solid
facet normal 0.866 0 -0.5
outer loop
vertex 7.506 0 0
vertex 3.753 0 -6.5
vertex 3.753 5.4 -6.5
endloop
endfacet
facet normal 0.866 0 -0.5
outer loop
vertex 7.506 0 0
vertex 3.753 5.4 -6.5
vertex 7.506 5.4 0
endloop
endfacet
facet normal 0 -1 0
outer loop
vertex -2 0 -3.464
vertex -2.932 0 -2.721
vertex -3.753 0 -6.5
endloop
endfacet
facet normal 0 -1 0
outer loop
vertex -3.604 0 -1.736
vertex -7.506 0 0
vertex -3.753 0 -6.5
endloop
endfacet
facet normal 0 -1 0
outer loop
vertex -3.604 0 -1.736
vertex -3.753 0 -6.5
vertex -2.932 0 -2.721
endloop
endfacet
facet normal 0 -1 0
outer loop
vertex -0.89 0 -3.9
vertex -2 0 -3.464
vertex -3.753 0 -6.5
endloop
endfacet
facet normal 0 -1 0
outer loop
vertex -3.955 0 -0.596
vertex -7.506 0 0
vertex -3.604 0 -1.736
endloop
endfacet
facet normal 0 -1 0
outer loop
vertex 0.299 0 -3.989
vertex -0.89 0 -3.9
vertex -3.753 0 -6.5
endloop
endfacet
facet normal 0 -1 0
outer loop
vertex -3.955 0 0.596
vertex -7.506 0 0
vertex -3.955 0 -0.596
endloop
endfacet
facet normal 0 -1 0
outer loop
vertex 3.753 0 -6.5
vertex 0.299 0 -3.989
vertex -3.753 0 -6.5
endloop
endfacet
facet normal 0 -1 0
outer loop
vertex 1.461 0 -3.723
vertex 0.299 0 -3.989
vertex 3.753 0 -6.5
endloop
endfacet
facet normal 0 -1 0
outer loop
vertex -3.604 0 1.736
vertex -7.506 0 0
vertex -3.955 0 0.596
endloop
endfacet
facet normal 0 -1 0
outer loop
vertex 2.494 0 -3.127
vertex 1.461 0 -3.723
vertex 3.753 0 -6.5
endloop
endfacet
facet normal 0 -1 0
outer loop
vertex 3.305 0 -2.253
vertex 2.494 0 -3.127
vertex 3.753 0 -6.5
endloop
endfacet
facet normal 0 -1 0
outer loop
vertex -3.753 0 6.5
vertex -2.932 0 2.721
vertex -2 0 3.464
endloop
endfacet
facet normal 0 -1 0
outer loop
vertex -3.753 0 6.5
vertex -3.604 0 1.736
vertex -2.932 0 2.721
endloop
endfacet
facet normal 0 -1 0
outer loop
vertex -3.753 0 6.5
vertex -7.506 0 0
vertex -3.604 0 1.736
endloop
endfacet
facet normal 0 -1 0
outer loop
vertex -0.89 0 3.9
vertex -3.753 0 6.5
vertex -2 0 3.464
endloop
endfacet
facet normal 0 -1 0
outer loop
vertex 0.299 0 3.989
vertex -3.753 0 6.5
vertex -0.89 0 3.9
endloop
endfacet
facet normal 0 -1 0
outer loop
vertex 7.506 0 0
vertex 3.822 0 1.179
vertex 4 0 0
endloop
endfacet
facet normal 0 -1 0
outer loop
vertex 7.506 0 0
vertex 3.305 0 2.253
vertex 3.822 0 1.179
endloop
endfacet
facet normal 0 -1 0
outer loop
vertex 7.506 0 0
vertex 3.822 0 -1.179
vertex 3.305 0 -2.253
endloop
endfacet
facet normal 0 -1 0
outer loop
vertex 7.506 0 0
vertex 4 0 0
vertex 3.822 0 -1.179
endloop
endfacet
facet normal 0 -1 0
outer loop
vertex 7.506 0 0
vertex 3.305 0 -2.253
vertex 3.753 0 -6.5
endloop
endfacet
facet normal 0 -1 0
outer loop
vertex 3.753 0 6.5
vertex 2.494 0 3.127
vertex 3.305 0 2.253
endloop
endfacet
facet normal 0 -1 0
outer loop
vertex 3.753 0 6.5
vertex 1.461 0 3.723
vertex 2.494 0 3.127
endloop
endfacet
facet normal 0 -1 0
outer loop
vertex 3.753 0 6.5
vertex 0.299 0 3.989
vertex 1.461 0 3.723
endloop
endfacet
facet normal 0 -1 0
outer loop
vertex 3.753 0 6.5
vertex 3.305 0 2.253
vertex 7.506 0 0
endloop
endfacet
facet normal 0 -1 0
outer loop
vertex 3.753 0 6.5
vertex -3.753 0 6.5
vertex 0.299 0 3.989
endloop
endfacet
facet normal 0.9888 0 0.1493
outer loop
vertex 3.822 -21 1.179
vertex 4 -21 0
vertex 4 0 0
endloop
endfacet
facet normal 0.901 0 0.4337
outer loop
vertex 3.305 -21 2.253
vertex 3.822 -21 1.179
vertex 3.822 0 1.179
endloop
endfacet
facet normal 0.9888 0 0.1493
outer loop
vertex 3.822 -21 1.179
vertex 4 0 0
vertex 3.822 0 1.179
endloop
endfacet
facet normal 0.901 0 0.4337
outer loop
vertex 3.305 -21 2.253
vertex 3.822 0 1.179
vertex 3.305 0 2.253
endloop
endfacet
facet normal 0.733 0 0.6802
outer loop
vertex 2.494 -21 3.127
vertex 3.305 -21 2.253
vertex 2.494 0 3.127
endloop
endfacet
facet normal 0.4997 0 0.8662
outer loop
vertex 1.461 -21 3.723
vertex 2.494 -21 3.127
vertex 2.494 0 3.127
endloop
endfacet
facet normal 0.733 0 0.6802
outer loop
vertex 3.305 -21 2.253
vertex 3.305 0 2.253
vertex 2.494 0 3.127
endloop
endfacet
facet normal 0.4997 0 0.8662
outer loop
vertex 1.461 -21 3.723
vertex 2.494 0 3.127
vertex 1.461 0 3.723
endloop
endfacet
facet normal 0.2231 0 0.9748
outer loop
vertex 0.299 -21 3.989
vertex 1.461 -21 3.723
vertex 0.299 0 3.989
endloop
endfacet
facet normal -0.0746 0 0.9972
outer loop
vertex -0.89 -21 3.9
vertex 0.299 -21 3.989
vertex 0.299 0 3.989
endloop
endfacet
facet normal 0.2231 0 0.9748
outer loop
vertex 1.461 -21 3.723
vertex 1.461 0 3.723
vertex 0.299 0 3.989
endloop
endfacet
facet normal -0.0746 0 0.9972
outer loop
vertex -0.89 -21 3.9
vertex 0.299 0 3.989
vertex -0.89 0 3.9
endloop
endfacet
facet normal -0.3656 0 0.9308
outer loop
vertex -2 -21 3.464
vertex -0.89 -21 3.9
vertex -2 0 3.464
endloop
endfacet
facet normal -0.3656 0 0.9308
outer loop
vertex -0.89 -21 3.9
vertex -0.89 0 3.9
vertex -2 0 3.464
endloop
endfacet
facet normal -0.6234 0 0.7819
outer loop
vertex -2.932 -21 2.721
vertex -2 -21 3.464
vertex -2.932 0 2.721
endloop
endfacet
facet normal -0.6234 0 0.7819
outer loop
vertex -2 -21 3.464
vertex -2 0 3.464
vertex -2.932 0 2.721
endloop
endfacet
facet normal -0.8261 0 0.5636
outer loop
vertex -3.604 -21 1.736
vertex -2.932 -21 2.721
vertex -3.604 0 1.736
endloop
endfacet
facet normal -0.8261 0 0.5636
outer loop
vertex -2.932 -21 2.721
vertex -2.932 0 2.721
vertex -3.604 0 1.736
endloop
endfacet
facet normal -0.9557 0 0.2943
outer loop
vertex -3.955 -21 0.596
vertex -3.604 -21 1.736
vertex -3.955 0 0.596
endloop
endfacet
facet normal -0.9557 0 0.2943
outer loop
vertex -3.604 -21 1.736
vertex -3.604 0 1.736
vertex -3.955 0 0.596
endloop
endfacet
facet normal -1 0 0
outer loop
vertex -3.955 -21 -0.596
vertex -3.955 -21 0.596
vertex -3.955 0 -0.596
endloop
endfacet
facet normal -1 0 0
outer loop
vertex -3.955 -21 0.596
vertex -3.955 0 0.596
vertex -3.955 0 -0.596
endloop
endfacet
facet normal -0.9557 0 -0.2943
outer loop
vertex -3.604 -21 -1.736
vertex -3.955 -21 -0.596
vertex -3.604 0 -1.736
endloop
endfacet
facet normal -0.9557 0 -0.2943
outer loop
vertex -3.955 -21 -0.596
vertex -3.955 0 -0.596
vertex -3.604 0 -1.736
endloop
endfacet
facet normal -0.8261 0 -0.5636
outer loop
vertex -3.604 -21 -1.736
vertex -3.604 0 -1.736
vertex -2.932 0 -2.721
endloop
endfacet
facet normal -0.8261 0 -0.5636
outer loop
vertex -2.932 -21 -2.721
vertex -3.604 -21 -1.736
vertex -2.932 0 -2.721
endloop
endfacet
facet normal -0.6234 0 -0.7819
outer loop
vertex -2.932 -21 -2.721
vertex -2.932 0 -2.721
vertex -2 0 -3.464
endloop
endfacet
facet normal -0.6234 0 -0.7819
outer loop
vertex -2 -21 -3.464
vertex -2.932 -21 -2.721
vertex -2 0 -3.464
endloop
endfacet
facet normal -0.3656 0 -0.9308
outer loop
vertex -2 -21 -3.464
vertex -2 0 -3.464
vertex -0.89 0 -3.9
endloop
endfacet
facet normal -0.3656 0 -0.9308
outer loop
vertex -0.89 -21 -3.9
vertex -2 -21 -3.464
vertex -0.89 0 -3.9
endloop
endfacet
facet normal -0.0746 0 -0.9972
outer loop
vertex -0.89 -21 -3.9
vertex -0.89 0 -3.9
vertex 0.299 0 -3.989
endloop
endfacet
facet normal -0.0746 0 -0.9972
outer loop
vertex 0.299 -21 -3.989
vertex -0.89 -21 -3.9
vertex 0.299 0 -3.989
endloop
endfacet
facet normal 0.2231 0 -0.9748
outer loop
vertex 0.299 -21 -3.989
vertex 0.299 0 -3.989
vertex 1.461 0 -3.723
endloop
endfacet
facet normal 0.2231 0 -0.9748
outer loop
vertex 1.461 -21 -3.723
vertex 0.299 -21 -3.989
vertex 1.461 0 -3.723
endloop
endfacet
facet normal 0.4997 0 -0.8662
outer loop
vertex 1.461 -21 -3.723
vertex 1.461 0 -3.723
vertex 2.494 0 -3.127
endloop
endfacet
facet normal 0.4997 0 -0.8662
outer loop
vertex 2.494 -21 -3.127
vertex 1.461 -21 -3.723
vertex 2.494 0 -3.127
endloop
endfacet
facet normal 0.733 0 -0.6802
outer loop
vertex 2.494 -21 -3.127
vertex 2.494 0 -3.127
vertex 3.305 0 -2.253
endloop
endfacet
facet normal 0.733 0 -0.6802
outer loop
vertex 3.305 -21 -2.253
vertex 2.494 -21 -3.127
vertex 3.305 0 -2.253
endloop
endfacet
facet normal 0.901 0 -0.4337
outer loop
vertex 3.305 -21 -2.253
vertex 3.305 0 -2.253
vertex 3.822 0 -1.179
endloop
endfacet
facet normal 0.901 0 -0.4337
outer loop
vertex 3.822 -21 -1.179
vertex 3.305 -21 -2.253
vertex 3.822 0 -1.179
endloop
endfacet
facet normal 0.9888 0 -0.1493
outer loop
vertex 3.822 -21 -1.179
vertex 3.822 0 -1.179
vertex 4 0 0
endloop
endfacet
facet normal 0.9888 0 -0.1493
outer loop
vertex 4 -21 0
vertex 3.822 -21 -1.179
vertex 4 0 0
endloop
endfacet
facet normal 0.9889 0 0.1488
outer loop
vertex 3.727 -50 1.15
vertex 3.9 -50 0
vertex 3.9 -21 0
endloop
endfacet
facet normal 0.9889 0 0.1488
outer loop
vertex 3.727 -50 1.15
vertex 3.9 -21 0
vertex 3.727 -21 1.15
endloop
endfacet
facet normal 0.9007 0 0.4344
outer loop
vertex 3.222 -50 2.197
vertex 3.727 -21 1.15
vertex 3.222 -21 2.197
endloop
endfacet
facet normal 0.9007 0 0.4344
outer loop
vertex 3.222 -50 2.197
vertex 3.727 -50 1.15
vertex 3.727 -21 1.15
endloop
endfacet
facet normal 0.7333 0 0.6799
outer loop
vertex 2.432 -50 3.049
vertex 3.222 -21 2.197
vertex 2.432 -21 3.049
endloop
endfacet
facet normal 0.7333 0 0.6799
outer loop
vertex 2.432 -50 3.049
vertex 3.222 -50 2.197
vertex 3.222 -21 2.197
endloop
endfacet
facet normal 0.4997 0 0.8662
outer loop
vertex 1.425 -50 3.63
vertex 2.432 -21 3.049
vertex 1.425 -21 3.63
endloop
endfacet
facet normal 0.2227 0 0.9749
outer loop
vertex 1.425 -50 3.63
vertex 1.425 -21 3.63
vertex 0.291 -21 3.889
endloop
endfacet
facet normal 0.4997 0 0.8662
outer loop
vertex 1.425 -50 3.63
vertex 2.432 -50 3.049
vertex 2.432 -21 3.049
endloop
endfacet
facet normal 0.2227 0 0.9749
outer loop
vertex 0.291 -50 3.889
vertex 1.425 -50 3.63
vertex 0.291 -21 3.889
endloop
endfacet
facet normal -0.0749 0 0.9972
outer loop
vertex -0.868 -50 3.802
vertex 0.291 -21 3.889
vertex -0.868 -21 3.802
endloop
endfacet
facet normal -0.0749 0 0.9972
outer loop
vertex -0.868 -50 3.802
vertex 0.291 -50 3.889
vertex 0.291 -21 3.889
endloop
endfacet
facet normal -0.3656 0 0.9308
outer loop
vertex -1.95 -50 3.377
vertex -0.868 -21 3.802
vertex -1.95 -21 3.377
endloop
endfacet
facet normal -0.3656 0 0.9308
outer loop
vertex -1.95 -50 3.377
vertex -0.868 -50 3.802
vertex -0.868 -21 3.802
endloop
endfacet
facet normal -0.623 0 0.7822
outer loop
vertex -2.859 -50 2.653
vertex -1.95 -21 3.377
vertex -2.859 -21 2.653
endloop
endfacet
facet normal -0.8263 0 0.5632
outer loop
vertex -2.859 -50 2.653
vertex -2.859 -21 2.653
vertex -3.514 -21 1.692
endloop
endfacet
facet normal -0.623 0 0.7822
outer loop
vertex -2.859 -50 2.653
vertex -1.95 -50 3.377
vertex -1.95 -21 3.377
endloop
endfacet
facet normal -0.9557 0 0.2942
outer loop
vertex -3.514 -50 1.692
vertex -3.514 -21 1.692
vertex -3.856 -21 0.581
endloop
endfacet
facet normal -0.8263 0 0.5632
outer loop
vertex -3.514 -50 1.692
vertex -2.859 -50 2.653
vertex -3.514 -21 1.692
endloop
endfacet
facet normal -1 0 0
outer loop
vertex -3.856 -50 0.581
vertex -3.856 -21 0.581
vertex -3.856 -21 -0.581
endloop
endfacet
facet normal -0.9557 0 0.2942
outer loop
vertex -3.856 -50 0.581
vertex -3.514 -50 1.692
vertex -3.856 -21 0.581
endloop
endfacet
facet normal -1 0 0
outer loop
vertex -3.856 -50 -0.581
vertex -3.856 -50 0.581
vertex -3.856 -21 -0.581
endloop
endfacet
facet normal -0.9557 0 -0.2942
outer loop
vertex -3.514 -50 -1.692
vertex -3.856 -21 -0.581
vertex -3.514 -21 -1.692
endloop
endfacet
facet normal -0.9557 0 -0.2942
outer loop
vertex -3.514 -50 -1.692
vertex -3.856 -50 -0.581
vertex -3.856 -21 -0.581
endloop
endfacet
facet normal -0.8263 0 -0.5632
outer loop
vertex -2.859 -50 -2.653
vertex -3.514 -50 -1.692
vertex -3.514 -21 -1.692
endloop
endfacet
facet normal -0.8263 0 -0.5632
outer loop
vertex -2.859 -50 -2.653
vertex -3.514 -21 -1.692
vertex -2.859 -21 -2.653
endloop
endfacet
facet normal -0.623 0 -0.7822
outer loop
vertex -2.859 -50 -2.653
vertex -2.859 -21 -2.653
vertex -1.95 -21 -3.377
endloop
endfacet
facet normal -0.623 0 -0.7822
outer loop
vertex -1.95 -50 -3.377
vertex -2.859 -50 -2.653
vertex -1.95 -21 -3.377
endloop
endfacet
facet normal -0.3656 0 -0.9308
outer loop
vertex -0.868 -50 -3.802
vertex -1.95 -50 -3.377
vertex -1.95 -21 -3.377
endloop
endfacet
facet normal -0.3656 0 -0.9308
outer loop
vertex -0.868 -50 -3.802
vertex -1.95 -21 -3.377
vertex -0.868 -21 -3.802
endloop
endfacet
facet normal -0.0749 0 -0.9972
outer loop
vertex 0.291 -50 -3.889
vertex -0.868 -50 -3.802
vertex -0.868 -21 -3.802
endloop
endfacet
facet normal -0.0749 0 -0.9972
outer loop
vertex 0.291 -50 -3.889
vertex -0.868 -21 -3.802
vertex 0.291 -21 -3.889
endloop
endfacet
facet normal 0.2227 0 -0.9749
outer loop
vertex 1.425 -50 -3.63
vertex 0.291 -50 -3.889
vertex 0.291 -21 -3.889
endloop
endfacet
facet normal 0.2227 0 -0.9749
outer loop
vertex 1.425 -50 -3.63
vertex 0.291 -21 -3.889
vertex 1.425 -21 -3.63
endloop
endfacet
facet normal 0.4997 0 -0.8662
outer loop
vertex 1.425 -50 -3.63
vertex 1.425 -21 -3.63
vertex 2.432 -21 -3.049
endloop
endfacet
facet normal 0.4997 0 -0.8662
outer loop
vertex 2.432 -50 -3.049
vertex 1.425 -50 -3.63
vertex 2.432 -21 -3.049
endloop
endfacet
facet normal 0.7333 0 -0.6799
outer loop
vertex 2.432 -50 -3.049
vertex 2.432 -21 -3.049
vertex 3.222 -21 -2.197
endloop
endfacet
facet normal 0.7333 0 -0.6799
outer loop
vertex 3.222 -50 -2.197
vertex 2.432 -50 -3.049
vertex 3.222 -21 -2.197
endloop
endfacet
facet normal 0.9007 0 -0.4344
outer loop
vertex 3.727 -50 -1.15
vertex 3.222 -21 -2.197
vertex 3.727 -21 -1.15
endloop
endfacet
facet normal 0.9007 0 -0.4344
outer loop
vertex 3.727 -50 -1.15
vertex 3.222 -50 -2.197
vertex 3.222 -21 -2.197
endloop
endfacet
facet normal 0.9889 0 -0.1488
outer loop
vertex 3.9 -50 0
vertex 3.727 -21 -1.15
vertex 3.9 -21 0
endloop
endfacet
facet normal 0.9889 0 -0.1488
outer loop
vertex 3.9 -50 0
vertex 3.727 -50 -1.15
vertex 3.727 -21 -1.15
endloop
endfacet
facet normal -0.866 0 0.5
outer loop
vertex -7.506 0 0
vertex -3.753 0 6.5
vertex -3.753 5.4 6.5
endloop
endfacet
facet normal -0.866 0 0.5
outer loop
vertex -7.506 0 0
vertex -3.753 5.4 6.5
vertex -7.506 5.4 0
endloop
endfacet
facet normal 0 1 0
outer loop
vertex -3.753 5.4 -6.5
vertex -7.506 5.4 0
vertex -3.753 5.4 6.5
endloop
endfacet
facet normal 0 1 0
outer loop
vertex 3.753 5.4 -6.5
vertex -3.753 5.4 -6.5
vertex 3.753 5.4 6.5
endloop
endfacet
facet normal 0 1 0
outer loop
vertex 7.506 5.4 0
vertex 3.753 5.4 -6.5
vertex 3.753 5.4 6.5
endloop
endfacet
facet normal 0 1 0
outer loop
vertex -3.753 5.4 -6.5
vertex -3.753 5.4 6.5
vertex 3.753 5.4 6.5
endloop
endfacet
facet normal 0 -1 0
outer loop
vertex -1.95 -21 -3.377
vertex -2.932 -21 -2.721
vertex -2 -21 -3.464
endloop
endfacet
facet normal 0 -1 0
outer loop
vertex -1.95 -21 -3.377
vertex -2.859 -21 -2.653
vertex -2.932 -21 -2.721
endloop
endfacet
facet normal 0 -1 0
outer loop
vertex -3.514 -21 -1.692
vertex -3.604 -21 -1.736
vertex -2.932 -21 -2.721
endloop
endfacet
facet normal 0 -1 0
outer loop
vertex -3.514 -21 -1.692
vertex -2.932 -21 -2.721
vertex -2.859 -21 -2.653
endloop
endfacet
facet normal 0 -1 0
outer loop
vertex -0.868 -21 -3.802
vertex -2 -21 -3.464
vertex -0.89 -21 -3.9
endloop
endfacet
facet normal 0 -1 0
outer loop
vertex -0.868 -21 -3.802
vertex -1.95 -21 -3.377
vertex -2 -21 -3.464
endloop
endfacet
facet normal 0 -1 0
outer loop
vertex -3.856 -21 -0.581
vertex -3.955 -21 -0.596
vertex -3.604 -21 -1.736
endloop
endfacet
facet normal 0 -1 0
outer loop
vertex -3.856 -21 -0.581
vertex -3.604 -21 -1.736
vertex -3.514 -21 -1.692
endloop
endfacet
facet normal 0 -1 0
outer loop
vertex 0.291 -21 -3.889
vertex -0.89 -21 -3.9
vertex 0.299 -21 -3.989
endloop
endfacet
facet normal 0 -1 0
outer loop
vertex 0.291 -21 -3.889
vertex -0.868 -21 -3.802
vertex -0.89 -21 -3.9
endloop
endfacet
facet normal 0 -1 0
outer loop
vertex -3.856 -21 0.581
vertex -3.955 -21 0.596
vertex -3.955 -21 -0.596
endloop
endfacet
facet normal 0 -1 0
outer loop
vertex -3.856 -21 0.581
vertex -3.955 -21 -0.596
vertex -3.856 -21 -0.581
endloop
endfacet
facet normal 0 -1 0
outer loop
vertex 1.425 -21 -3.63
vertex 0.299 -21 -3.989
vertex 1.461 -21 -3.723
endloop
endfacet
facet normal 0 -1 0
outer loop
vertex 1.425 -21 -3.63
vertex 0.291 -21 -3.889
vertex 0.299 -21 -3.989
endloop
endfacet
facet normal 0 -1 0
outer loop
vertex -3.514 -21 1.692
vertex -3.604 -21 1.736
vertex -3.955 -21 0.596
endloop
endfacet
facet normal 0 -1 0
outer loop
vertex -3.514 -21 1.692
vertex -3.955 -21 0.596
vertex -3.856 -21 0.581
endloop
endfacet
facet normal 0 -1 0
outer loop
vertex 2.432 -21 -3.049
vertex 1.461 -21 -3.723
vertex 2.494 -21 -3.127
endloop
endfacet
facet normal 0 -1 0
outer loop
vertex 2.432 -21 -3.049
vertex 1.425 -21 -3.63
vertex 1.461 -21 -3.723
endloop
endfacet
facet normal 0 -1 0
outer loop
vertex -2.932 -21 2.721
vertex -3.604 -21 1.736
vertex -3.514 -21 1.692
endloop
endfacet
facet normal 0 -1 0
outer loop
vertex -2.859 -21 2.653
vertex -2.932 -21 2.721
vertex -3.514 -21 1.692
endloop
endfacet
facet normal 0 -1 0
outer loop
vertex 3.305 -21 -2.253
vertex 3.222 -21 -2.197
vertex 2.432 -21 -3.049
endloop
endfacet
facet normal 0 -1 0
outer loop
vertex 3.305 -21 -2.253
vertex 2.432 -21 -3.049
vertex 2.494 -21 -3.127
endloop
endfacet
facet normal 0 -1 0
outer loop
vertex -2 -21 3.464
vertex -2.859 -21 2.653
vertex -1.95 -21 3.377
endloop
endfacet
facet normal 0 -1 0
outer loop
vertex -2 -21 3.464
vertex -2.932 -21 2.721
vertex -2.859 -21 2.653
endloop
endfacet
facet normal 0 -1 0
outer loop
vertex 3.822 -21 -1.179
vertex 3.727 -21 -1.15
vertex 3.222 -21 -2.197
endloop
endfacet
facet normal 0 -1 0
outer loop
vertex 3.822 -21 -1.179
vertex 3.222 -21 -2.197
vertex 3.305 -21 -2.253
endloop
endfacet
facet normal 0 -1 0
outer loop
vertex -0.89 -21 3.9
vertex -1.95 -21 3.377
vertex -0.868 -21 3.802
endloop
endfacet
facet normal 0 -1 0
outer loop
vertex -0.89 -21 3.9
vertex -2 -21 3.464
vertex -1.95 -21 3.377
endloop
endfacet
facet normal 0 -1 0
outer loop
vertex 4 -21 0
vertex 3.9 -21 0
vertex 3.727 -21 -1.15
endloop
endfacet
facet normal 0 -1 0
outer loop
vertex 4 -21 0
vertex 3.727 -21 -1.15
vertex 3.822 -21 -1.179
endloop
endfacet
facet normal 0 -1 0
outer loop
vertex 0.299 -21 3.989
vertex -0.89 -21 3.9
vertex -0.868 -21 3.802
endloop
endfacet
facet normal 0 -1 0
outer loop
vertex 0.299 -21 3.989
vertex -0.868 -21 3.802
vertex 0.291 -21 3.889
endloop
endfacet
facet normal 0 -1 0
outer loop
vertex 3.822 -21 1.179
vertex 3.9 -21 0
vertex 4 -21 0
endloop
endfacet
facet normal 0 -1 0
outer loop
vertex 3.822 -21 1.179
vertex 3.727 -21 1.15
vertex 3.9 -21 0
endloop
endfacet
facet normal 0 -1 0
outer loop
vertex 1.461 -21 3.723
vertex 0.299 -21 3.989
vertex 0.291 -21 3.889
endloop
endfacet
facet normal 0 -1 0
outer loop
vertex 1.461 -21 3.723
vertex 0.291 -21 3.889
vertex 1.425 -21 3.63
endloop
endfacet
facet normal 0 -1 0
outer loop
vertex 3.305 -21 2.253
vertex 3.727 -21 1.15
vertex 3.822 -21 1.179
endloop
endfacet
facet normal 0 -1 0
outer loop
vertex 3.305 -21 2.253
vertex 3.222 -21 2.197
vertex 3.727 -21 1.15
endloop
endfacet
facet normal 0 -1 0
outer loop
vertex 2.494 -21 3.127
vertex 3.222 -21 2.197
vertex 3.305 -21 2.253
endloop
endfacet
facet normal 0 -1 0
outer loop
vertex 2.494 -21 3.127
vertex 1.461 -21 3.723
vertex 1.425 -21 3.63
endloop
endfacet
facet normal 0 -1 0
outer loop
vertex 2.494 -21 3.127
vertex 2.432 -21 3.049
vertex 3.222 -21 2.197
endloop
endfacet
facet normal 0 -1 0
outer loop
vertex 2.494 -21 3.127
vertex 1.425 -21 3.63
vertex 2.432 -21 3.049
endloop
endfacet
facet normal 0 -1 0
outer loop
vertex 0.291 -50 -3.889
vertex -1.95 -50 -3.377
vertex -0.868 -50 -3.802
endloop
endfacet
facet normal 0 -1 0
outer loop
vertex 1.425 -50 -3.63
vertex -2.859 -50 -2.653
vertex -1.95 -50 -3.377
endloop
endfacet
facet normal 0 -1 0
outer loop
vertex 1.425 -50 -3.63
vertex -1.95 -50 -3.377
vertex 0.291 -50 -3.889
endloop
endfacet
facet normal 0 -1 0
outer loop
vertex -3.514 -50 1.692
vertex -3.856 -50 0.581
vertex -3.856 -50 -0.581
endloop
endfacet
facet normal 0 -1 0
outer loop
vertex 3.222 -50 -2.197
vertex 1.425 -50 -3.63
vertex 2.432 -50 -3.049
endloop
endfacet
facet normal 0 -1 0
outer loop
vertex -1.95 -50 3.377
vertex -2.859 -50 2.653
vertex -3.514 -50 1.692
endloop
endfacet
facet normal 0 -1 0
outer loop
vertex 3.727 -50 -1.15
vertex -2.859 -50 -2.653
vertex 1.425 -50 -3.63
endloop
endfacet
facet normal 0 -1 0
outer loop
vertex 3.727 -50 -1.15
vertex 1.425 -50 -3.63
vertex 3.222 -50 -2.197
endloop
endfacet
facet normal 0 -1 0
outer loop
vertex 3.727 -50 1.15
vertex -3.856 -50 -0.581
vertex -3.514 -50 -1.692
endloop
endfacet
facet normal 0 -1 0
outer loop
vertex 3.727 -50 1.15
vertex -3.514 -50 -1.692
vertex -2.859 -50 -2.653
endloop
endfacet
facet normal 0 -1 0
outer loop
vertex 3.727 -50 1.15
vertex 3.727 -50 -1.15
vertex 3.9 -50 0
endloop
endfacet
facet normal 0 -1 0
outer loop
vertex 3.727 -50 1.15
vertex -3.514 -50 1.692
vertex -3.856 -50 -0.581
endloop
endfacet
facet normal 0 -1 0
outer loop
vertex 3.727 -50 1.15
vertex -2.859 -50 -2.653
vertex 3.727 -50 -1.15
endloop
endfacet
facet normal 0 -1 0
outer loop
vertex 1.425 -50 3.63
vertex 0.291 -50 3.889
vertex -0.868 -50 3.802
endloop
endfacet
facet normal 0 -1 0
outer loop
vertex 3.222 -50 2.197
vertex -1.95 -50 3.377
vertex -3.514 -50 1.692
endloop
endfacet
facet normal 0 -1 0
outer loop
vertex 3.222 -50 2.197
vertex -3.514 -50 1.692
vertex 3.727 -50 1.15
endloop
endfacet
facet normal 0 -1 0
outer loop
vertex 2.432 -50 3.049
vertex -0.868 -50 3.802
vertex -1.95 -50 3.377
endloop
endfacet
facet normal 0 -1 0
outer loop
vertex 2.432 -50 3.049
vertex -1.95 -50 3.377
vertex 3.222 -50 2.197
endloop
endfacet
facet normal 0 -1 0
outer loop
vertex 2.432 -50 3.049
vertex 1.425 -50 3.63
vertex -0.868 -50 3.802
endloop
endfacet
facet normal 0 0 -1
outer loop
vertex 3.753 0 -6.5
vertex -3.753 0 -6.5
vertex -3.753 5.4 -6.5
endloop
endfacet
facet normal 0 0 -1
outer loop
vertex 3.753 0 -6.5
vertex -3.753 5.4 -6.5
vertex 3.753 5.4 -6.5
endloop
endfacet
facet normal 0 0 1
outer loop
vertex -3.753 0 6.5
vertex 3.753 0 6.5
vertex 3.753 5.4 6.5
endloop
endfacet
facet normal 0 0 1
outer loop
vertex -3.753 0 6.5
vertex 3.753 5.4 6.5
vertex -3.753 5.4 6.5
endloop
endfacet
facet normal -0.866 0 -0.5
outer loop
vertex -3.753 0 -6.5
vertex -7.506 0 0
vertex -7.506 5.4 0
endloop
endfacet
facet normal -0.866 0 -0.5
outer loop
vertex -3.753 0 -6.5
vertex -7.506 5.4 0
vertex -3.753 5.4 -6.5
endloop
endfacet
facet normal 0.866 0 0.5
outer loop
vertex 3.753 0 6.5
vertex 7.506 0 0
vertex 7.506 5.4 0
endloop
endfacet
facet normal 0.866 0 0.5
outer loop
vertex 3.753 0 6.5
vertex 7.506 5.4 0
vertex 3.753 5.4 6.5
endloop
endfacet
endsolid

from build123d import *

# Parameters (mm, degrees)
F0_R     = 4
F1_DEPTH = 50
F2_DEPTH = 5.4
F3_R     = 4
F3_R_2   = 3.9
F4_DEPTH = 29


with BuildPart() as f1:
    # F0 (on Front) → F1 (new body)
    with BuildSketch(Plane.XZ):
        Circle(F0_R)
    extrude(amount=F1_DEPTH)

    # F0 (on Front) → F2 (join)
    with BuildSketch(Plane.XZ):
        Polygon((3.7527767497, 6.5), (-3.7527767497, 6.5), (-7.5055534995, 0), (-3.7527767497, -6.5), (3.7527767497, -6.5), (7.5055534995, 0), align=None)
        Circle(F0_R, mode=Mode.SUBTRACT)
        Circle(F0_R)
    extrude(amount=-F2_DEPTH)

    # F3 (on face) → F4 (cut)
    with BuildSketch(Plane.XZ.offset(50)):
        Circle(F3_R)
        Circle(F3_R_2, mode=Mode.SUBTRACT)
    extrude(amount=-F4_DEPTH, mode=Mode.SUBTRACT)


solid = f1.part
